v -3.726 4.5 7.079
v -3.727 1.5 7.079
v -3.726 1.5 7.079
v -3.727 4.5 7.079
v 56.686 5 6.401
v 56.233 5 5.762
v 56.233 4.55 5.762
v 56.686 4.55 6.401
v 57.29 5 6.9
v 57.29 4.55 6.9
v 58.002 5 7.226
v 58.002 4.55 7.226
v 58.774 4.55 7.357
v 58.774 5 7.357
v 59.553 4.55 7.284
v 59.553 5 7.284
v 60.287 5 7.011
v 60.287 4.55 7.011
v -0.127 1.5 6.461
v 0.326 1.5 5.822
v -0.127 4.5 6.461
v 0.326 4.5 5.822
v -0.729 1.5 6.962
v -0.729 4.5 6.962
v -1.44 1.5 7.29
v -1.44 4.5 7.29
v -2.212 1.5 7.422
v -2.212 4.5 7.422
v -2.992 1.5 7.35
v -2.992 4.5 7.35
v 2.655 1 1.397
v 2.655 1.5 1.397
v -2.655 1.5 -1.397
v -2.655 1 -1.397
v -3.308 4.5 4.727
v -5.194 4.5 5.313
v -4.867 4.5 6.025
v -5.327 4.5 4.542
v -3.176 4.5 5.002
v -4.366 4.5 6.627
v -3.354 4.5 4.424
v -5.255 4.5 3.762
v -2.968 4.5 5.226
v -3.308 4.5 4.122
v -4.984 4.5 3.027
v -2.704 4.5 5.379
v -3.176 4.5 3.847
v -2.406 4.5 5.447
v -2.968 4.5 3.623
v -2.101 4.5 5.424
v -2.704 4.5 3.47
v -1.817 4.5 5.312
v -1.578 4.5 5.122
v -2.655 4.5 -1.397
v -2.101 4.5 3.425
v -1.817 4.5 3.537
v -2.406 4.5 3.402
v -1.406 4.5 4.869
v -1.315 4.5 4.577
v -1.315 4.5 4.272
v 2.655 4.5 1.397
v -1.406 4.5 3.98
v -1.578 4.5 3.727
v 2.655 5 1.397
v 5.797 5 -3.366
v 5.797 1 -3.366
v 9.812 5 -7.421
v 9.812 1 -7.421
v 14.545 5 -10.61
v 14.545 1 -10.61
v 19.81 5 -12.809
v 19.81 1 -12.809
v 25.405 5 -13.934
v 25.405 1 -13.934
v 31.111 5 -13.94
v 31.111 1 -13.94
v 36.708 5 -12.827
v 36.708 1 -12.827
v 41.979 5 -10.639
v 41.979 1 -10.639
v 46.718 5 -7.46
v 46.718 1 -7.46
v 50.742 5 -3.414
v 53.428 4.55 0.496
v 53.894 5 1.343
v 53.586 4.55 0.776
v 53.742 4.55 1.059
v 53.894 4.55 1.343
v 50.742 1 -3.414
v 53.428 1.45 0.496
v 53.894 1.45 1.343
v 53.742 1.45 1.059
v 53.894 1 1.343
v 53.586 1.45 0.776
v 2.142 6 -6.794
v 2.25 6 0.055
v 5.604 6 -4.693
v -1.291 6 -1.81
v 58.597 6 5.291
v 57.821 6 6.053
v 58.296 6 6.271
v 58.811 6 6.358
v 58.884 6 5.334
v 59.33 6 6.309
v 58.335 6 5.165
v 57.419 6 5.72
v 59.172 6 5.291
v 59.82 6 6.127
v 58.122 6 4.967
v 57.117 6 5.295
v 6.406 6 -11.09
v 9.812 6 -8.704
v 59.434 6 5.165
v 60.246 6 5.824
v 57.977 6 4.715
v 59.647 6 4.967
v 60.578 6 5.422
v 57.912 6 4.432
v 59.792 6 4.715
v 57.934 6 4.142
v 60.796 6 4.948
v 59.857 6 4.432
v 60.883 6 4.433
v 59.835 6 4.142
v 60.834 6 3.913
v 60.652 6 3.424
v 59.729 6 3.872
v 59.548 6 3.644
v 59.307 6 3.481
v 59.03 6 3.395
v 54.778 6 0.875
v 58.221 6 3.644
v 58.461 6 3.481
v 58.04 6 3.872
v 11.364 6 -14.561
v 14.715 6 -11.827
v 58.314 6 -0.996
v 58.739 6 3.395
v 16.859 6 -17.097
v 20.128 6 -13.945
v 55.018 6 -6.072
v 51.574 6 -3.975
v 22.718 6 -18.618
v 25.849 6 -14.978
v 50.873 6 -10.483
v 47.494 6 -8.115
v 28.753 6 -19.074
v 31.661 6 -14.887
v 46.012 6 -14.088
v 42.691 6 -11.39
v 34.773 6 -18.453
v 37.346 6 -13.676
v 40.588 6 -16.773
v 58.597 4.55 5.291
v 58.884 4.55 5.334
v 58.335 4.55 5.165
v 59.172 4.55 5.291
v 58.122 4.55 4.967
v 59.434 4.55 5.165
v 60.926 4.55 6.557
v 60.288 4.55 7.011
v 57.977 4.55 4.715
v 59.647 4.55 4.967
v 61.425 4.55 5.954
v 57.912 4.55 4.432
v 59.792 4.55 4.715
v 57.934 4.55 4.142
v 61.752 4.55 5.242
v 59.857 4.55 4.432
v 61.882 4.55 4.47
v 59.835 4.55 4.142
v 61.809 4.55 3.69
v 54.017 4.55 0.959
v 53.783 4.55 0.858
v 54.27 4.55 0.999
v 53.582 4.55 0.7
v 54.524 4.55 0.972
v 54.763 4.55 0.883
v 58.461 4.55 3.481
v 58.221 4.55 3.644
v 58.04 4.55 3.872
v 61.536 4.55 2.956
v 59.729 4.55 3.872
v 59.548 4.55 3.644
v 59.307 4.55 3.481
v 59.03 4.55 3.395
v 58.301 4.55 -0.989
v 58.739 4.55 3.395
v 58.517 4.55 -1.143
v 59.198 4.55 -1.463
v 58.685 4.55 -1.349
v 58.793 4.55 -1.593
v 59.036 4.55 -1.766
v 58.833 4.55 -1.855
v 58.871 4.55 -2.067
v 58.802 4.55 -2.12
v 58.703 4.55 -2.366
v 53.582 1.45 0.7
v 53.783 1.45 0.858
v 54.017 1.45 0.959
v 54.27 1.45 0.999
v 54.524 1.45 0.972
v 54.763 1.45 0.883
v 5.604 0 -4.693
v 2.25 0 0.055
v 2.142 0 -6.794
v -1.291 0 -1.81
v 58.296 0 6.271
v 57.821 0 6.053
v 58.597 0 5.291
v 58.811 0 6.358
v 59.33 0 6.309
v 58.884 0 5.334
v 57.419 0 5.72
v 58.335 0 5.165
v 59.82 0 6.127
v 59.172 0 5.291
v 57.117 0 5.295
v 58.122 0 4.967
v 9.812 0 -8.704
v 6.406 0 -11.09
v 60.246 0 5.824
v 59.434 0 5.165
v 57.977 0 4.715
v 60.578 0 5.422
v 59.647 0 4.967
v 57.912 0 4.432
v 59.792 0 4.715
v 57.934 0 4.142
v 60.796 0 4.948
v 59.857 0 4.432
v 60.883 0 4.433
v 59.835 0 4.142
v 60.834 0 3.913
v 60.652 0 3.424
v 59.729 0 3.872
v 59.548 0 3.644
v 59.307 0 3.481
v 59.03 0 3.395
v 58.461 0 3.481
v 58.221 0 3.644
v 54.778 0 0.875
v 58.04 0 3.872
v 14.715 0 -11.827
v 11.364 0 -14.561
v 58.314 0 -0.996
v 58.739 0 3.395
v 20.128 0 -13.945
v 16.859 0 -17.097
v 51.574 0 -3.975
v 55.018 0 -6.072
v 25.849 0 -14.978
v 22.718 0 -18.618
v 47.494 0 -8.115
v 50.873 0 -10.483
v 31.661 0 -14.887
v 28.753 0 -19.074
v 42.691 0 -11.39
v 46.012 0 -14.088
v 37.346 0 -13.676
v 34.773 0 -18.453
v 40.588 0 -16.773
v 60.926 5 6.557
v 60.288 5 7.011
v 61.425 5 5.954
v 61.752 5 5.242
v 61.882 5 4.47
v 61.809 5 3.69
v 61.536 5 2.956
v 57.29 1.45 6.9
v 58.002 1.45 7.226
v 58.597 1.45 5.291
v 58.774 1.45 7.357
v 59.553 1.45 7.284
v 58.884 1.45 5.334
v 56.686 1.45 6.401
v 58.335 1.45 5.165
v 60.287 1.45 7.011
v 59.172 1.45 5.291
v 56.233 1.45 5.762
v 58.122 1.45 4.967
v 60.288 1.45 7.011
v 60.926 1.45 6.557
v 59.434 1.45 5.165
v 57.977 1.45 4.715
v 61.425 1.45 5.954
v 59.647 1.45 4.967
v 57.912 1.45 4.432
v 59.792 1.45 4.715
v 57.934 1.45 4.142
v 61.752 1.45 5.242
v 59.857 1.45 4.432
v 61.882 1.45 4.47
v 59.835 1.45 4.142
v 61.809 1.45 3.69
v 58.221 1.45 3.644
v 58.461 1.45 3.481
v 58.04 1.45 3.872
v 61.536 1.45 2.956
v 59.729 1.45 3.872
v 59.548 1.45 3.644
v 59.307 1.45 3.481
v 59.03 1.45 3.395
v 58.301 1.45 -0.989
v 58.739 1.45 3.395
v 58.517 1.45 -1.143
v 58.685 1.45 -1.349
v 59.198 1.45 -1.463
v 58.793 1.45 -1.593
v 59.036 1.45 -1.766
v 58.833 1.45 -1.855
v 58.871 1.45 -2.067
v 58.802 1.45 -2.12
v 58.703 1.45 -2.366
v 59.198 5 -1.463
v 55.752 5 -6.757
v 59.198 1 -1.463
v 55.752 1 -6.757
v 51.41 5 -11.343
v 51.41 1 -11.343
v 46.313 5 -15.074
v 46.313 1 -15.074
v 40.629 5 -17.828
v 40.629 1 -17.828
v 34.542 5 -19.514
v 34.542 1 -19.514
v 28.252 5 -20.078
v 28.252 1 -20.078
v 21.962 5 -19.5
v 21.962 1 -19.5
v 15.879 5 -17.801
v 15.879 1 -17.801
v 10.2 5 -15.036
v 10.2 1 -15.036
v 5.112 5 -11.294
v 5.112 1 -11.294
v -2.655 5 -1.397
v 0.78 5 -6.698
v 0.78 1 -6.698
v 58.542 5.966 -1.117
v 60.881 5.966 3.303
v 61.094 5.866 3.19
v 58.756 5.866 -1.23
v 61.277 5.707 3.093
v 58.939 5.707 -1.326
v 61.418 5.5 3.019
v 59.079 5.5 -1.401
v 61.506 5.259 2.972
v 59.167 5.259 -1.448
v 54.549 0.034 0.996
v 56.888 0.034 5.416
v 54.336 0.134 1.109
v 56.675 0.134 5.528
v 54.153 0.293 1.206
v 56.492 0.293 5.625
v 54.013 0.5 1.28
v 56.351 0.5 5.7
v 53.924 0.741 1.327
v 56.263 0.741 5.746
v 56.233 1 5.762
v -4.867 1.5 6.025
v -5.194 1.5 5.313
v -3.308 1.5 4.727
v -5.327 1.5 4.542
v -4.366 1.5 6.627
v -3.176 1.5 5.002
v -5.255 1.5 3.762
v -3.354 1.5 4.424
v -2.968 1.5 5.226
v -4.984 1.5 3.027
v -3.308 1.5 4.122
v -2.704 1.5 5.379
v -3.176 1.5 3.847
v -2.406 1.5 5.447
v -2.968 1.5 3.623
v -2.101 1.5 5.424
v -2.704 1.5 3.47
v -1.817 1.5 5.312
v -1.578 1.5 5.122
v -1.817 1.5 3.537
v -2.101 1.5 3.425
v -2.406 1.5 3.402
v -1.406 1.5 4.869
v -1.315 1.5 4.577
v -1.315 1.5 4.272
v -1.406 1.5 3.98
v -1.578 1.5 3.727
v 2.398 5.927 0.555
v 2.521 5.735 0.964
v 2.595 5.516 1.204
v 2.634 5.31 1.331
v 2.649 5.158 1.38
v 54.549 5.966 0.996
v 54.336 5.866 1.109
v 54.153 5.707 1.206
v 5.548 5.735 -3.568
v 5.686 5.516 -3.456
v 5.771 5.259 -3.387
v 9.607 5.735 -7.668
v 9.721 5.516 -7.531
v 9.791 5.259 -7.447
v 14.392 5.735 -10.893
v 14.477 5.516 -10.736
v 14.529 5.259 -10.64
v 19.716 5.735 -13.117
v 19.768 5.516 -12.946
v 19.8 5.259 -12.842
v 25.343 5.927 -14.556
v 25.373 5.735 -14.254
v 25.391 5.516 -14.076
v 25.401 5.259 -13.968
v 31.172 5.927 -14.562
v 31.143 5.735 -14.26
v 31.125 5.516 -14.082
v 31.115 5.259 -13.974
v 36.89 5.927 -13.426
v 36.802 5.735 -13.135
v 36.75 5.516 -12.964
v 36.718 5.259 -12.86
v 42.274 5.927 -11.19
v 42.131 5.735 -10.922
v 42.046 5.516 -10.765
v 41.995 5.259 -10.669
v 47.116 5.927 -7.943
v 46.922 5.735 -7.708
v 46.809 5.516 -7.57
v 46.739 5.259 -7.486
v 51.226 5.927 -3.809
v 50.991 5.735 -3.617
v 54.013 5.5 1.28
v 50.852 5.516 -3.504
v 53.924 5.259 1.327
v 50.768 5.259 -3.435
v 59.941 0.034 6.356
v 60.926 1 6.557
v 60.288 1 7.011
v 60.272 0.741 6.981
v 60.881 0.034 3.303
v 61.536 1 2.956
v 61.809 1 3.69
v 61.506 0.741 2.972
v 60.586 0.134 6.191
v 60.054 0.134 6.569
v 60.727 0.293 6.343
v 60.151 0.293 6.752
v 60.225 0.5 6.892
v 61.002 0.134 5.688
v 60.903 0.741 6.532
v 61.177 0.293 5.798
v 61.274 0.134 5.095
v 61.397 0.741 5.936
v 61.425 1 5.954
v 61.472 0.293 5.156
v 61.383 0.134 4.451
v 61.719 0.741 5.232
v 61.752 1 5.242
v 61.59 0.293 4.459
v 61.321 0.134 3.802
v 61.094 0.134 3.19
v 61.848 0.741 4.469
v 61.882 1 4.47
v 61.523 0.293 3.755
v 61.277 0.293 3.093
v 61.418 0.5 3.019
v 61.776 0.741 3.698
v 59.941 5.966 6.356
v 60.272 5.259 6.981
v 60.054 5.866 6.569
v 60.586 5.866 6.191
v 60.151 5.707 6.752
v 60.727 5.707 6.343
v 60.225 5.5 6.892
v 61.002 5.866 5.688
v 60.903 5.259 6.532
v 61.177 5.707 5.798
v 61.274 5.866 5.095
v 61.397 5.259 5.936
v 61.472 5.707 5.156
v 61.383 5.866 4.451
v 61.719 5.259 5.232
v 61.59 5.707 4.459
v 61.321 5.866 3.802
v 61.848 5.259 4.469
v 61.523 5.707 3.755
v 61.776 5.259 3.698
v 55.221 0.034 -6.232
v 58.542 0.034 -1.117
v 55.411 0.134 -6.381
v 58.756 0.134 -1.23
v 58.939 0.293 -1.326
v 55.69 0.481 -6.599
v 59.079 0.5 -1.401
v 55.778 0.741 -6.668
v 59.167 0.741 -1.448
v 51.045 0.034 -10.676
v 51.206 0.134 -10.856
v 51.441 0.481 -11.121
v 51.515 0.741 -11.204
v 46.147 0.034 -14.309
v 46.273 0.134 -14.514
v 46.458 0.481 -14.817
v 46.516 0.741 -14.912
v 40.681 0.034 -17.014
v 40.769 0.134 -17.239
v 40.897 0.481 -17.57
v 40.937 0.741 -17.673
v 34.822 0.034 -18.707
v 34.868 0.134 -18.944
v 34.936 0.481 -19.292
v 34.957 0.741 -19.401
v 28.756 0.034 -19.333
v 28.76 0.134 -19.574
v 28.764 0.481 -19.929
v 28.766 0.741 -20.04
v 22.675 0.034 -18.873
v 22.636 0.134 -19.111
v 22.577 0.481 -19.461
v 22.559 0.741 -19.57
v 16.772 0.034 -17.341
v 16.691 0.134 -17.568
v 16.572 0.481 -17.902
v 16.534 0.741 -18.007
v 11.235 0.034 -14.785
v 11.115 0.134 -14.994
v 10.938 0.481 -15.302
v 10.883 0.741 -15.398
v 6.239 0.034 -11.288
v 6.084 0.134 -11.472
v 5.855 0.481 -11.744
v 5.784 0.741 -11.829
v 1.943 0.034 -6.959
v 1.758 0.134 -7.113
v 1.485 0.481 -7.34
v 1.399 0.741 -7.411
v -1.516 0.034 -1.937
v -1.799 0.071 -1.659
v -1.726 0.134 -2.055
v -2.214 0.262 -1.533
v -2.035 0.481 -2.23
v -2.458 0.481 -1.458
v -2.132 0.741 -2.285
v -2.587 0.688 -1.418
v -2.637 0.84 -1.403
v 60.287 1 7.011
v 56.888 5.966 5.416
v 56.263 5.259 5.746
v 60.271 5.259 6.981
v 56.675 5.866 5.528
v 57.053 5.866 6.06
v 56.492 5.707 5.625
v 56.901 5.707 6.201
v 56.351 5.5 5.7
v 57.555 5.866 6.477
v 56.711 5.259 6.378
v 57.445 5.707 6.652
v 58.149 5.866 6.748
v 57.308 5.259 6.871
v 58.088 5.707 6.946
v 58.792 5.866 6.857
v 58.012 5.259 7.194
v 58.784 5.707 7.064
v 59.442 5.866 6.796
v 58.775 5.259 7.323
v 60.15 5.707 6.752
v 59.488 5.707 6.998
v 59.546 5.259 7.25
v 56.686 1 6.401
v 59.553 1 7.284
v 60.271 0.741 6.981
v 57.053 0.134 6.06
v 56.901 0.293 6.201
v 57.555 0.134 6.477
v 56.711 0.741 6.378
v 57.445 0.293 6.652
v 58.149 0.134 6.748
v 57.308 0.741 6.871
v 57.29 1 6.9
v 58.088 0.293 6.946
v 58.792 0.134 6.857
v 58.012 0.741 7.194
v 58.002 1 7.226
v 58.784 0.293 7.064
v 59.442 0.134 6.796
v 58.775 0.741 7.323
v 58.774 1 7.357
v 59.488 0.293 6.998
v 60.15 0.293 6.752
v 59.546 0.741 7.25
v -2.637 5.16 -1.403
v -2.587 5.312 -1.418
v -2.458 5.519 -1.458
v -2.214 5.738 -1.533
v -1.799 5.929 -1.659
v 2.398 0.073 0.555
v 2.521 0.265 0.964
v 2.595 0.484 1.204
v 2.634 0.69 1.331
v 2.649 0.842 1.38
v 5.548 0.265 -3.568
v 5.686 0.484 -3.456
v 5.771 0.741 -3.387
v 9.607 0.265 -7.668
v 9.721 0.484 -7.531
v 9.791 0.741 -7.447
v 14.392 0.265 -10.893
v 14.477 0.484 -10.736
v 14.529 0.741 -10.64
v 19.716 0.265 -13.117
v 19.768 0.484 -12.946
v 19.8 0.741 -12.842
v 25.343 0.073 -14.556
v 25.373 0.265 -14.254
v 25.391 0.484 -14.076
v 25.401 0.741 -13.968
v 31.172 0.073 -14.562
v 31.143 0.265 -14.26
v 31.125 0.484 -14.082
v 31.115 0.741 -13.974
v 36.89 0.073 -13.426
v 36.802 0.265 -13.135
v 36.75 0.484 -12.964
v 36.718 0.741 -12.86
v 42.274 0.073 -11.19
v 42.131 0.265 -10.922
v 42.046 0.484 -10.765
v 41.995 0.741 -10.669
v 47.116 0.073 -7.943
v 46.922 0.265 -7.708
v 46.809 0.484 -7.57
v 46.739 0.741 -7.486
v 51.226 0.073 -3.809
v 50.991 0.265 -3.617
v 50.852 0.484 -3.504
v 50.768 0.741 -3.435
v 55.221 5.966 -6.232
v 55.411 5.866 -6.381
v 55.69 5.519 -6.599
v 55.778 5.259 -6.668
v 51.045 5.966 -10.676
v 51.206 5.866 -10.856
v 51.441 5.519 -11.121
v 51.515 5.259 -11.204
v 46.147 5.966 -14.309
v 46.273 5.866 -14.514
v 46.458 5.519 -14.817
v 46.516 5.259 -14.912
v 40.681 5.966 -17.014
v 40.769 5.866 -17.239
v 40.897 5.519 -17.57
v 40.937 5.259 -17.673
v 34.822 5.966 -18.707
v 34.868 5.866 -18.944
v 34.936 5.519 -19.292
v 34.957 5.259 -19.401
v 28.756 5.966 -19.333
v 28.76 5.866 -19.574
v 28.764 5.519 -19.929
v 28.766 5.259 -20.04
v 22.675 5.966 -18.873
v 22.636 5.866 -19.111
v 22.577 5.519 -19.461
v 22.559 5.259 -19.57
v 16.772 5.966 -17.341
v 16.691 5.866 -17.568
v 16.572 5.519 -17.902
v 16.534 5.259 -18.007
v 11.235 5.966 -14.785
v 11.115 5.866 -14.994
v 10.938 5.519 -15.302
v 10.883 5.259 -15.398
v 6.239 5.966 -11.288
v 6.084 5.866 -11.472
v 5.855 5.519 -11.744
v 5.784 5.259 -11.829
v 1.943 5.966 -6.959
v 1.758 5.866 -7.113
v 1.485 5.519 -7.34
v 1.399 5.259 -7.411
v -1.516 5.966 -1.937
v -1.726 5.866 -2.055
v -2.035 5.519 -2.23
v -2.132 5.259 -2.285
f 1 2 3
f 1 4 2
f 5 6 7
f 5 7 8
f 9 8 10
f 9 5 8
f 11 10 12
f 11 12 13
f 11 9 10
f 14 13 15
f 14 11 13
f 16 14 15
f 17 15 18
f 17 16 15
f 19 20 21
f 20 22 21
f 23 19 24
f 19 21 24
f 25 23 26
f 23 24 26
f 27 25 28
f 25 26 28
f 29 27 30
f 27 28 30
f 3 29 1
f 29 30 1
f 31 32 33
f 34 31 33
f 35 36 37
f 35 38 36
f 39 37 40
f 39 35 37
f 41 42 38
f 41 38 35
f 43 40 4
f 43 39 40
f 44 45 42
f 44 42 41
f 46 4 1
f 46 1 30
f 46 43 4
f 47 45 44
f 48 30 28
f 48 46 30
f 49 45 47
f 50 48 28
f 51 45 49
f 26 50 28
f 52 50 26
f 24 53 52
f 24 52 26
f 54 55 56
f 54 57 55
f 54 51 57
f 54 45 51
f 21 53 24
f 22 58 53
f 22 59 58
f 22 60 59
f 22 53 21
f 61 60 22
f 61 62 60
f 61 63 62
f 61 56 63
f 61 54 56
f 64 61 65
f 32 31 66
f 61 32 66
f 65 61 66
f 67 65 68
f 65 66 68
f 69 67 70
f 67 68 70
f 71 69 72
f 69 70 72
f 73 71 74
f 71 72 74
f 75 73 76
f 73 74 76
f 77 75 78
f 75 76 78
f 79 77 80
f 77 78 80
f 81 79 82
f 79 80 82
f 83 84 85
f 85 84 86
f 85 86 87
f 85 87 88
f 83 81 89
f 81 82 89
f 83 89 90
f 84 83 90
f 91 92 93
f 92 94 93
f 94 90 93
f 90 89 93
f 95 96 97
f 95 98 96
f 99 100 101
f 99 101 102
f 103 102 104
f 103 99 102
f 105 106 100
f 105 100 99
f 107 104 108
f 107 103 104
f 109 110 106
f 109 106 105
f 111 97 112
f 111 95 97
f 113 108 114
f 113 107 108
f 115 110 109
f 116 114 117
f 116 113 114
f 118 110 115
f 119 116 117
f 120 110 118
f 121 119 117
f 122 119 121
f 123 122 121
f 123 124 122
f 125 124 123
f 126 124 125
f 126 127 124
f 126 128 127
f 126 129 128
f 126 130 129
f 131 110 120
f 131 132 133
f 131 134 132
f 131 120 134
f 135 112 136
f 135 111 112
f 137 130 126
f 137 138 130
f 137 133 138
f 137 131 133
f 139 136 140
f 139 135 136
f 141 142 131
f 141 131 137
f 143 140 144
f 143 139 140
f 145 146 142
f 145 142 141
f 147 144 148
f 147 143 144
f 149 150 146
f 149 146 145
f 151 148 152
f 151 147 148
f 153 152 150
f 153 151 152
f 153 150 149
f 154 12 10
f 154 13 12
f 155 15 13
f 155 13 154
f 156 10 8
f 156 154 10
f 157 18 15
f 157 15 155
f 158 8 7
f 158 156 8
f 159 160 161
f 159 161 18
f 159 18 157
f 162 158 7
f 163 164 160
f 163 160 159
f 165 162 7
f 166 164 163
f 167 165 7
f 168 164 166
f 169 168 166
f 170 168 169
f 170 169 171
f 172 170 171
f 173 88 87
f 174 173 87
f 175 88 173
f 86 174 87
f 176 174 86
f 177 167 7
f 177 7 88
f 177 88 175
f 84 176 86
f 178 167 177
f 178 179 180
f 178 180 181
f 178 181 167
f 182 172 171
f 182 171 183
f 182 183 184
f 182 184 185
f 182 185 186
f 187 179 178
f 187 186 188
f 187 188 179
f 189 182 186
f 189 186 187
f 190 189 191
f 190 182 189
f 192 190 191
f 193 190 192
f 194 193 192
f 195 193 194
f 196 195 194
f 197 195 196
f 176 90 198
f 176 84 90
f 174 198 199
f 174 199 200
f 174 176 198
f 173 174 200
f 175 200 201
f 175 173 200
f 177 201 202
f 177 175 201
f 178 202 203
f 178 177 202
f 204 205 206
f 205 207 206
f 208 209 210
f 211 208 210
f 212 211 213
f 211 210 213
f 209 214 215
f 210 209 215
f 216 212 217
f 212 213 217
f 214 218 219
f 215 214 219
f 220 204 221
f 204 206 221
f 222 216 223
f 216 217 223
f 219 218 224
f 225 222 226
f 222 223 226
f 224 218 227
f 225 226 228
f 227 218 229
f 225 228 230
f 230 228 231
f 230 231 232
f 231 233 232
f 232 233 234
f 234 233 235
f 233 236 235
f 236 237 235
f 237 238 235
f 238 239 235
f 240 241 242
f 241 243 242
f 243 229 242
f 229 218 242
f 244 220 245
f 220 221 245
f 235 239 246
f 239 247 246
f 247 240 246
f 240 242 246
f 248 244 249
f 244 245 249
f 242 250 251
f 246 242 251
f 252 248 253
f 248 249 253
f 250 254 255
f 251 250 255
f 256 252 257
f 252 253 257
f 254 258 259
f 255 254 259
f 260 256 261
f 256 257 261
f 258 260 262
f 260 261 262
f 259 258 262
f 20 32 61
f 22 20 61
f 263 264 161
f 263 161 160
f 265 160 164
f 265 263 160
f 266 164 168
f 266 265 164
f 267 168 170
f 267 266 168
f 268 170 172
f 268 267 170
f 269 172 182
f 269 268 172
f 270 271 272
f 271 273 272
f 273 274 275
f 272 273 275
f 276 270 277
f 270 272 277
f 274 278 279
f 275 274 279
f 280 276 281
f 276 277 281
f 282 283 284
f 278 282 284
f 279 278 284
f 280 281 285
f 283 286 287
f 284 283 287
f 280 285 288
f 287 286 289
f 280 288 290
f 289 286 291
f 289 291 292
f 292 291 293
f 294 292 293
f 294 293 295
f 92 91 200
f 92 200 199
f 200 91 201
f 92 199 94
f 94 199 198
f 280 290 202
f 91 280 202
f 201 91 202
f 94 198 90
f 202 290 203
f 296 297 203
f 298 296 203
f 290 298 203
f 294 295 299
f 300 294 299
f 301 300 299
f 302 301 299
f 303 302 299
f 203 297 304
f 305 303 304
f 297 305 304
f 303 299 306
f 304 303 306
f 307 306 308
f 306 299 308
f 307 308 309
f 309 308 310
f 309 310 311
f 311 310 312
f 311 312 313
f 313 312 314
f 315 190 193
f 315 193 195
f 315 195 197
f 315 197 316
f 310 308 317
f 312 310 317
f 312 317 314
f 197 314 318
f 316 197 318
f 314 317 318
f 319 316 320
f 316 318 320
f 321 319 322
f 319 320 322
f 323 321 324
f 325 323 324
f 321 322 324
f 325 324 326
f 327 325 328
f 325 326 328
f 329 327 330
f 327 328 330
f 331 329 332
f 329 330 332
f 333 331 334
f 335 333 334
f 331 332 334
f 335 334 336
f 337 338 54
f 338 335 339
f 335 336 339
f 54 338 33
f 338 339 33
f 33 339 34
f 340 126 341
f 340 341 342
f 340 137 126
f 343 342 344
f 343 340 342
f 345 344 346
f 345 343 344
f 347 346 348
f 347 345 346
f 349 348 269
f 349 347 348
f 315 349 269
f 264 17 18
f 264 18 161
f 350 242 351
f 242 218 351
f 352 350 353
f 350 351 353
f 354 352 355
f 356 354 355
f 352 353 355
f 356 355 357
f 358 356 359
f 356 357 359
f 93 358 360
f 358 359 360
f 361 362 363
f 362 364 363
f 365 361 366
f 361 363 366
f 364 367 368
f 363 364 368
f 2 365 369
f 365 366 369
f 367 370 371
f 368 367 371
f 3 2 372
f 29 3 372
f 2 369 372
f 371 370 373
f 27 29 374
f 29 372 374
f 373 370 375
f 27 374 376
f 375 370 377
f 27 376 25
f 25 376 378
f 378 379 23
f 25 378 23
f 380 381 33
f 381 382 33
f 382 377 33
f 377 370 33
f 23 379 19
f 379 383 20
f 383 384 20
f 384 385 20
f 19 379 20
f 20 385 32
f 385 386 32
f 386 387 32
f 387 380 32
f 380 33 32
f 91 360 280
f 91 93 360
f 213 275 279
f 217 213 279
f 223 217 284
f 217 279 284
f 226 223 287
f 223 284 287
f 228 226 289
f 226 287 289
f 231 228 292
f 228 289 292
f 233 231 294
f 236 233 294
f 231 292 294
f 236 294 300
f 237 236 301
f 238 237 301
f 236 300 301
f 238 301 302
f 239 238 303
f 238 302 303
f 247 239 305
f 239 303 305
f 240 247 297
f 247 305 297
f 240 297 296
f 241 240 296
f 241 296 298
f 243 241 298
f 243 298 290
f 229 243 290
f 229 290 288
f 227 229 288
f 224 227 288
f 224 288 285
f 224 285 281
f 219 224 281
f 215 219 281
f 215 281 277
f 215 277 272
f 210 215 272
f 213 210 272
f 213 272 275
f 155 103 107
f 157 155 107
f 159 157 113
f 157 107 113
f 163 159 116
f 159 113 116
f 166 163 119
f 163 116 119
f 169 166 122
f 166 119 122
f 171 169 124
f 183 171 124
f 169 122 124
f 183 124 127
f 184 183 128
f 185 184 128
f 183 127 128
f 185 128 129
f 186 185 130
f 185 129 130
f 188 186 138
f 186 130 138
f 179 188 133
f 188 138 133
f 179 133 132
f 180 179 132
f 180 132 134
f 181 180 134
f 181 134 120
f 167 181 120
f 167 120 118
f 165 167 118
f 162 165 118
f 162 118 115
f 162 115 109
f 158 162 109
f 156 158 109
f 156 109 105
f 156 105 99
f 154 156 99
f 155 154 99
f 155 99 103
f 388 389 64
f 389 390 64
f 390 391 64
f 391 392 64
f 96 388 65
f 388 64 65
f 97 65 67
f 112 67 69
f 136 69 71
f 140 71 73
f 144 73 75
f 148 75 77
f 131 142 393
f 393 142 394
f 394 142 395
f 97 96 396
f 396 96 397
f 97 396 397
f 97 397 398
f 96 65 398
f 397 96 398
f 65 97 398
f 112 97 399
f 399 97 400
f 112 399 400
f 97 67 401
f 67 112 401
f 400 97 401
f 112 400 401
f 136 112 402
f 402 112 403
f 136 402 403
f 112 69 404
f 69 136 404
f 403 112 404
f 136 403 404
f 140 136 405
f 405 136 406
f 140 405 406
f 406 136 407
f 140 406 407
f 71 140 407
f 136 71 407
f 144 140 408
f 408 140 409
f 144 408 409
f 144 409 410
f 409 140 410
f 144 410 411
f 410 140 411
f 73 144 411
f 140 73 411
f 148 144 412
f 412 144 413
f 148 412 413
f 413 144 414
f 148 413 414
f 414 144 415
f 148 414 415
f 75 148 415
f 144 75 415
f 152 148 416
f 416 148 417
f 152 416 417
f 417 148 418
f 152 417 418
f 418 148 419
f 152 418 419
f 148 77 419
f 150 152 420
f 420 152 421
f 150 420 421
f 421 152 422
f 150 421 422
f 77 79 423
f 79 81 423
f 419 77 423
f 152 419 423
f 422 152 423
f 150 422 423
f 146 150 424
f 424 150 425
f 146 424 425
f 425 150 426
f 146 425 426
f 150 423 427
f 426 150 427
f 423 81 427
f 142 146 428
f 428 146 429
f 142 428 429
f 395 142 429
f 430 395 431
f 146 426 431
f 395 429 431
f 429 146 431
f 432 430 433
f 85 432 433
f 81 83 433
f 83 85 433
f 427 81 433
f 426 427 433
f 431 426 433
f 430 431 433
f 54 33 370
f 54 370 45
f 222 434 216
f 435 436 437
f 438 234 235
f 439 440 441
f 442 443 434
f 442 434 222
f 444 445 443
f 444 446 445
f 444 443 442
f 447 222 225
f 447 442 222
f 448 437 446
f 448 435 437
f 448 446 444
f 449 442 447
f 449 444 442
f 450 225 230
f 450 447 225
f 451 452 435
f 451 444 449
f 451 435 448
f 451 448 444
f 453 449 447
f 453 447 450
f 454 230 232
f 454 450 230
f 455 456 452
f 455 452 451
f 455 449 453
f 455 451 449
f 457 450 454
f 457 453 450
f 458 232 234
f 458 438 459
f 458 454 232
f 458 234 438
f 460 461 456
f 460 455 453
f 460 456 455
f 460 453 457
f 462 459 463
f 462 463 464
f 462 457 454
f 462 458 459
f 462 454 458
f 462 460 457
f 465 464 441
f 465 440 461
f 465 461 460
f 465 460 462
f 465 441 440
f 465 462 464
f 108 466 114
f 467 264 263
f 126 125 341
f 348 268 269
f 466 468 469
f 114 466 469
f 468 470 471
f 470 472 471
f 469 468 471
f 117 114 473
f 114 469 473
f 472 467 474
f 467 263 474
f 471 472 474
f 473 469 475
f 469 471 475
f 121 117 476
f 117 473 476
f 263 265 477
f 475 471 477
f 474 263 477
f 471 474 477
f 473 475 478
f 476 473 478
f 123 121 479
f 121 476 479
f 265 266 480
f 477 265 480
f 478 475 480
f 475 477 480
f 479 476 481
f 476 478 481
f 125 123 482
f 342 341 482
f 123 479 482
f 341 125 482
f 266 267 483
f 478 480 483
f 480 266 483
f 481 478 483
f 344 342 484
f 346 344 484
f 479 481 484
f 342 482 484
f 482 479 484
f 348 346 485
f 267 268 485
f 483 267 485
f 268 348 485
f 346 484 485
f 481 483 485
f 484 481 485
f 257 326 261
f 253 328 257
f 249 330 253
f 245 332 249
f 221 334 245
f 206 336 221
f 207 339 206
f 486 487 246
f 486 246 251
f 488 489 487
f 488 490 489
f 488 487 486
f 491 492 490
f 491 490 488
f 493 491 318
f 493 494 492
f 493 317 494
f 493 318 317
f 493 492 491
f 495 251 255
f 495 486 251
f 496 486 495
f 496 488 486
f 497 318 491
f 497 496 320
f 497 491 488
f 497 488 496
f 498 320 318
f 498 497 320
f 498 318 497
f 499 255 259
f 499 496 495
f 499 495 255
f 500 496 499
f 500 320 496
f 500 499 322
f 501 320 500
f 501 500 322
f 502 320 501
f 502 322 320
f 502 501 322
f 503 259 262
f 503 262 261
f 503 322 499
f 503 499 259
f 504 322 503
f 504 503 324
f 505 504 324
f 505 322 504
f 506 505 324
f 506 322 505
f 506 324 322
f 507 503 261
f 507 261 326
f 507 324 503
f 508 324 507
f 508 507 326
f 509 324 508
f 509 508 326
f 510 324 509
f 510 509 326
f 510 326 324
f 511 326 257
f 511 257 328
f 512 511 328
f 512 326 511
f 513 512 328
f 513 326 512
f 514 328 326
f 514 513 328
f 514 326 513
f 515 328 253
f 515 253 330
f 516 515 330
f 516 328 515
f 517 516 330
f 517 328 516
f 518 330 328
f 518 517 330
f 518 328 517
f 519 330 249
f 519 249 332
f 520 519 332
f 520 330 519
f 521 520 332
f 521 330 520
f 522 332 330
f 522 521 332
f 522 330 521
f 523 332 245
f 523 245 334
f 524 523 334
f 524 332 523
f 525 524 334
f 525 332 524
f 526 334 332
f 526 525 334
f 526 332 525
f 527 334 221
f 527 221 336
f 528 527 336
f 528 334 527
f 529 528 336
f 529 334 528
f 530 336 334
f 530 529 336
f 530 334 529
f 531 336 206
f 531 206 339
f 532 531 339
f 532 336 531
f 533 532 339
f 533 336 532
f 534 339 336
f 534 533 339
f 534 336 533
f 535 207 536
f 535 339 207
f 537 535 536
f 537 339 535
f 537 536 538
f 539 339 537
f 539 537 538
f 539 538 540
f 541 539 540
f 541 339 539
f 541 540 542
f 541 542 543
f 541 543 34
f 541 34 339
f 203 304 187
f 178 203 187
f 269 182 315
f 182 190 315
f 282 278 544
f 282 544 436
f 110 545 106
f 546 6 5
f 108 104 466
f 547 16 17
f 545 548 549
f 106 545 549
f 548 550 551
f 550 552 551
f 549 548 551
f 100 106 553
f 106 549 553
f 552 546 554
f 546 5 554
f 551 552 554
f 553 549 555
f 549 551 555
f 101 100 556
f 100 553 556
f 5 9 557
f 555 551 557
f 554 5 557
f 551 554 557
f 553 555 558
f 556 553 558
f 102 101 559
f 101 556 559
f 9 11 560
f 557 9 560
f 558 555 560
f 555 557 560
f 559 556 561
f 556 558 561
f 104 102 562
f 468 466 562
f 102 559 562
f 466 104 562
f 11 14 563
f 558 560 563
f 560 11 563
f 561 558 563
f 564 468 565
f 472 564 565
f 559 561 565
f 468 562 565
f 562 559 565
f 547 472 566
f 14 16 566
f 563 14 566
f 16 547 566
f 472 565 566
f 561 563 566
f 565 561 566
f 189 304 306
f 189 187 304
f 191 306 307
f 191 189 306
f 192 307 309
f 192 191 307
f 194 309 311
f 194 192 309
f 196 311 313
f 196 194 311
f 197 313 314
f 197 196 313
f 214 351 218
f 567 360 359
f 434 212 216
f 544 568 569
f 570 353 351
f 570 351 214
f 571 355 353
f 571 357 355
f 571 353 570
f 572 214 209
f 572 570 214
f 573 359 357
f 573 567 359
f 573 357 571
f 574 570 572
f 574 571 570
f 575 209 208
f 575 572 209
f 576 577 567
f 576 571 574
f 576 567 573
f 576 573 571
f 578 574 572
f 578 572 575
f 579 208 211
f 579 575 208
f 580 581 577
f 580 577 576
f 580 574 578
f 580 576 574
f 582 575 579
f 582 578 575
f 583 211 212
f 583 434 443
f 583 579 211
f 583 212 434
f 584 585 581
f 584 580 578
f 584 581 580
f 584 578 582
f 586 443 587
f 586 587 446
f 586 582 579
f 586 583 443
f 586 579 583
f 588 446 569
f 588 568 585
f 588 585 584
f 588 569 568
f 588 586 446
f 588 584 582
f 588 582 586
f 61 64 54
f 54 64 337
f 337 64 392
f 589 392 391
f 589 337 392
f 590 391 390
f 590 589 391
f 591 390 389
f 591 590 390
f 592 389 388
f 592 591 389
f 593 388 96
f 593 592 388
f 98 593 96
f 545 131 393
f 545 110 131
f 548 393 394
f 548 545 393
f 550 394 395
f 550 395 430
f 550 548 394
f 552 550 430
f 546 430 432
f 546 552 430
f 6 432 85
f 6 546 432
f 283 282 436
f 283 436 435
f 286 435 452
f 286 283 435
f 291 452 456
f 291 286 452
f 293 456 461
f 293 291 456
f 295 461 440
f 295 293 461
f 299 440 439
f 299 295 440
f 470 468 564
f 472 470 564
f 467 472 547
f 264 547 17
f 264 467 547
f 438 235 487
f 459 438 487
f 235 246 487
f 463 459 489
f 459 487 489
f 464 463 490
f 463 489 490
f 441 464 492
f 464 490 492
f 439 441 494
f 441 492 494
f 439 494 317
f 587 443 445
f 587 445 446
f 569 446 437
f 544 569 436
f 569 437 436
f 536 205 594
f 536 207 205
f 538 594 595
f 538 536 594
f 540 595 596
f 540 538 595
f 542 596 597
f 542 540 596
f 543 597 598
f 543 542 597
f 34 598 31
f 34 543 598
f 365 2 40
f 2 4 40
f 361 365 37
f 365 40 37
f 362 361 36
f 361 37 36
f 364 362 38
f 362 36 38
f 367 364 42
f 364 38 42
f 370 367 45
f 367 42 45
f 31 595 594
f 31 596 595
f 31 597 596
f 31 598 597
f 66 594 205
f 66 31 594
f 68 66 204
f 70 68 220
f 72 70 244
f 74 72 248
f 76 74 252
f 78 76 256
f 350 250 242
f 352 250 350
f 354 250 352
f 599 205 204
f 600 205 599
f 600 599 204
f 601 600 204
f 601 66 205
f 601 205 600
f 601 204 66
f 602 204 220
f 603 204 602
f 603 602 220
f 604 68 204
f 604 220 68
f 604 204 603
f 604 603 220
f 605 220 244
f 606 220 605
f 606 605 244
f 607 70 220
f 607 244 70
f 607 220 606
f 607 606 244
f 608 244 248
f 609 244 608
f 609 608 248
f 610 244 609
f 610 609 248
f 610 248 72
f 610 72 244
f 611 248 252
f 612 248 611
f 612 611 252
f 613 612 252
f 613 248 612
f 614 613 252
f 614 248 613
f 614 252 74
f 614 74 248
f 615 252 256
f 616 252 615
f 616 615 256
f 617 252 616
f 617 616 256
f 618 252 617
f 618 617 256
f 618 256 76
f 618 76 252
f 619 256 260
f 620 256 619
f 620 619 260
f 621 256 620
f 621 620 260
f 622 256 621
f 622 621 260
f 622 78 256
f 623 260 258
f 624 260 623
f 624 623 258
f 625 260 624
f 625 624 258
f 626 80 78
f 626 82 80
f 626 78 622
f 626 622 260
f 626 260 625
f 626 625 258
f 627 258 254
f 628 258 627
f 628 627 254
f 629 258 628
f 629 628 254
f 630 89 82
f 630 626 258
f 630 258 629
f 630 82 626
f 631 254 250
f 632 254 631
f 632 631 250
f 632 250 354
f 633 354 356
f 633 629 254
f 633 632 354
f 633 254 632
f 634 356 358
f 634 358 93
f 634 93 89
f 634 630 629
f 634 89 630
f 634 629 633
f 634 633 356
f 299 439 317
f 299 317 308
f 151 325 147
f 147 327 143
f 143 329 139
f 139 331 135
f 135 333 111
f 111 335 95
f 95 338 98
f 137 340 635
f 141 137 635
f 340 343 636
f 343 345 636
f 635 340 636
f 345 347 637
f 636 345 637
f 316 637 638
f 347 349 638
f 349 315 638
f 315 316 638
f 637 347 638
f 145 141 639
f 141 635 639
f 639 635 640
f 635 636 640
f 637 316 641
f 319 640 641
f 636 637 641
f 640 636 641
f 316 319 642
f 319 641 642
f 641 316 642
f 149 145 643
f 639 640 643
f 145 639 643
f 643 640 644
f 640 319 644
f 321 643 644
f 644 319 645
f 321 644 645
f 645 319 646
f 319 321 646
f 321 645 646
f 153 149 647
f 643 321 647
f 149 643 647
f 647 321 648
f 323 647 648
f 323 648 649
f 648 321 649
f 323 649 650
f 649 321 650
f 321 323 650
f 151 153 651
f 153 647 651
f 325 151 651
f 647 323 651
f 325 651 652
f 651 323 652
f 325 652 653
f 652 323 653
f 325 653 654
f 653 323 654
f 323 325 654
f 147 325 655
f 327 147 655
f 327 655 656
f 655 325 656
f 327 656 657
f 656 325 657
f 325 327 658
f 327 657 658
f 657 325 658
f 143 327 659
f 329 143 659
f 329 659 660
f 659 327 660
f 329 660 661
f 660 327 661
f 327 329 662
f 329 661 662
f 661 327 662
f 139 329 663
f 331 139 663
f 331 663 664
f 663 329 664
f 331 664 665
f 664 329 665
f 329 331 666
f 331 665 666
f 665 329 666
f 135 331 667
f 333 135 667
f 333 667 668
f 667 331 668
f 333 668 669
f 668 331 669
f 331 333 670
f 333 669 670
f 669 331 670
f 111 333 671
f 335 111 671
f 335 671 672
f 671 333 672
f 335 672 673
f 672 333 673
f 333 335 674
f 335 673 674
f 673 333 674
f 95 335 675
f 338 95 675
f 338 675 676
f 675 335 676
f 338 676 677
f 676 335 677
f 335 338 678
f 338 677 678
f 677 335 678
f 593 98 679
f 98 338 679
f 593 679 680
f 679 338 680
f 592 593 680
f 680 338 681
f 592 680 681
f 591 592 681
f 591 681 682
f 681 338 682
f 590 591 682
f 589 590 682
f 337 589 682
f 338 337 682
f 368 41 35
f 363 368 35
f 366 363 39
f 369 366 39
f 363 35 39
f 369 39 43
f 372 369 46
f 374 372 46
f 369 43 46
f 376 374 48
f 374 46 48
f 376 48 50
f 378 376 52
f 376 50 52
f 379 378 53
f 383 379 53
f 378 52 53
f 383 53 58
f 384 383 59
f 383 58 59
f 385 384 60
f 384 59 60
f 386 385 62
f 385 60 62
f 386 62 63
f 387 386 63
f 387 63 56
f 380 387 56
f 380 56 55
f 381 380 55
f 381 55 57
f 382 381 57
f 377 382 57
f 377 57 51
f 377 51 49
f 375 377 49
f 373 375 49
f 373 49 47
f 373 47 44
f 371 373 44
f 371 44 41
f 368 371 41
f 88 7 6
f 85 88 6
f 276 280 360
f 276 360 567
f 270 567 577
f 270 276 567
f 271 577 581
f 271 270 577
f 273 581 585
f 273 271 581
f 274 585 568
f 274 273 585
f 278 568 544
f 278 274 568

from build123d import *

# Parameters (mm, degrees)
BOSS_EXTRUDE1_DEPTH = 6
CUT_EXTRUDE1_DEPTH  = 6
SKETCH3_W           = 6
SKETCH3_H           = 6
BOSS_EXTRUDE2_DEPTH = 8
SKETCH5_W           = 8
SKETCH5_H           = 3.1
CUT_EXTRUDE2_DEPTH  = 8
SKETCH6_R           = 0.975
CUT_EXTRUDE3_DEPTH  = 8
SKETCH7_W           = 6
SKETCH7_H           = 3
BOSS_EXTRUDE3_DEPTH = 8
SKETCH8_R           = 1.025
CUT_EXTRUDE4_DEPTH  = 8
FILLET1_R           = 3
FILLET2_R           = 1


with BuildPart() as part:
    # Sketch1 → Boss-Extrude1 (new body)
    with BuildSketch(Plane(origin=(0, 0, 0), x_dir=(1, 0, 0), z_dir=(0, 1, 0))):
        with BuildLine():
            ThreePointArc((59.197580629, 1.463473077), (28.251548273, 20.077561964), (-2.65465833, 1.397422323))
            ThreePointArc((-2.65465833, 1.397422323), (-1.397422323, -2.65465833), (2.65465833, -1.397422323))
            ThreePointArc((2.65465833, -1.397422323), (28.257955548, 14.077565385), (53.894245187, -1.342704605))
            ThreePointArc((53.894245187, -1.342704605), (57.949001749, -2.591283485), (59.197580629, 1.463473077))
        make_face()
    extrude(amount=BOSS_EXTRUDE1_DEPTH)

    # Sketch2 → Cut-Extrude1 (cut)
    with BuildSketch(Plane(origin=(0, 6, 0), x_dir=(1, 0, 0), z_dir=(0, 1, 0))):
        Polygon((53.894245187, -1.342704605), (59.197580629, 1.463473077), (61.240293877, -2.397007189), (55.867953369, -5.072773667), align=None)
        Polygon((2.65465833, -1.397422323), (-2.65465833, 1.397422323), (-5.113209947, -2.397007189), (1.520441913, -5.715494495), align=None)
    extrude(amount=-CUT_EXTRUDE1_DEPTH, mode=Mode.SUBTRACT)

    # Sketch3 → Boss-Extrude2 (add)
    with BuildSketch(Plane(origin=(12.343879945, 0, 23.328435834), x_dir=(0.883889240381717, 0, -0.46769628044002154), z_dir=(0.4676962804400216, 0, 0.8838892403817171))):
        with Locations((50.008565489, 3)):
            Rectangle(SKETCH3_W, SKETCH3_H)
    extrude(amount=BOSS_EXTRUDE2_DEPTH)

    # Sketch5 → Cut-Extrude2 (cut)
    with BuildSketch(Plane(origin=(46.853700684, 0, -24.791908911), x_dir=(-0.46769628044002165, 0, -0.883889240381717), z_dir=(0.883889240381717, 0, -0.46769628044002165))):
        with Locations((-30.392940165, 3)):
            Rectangle(SKETCH5_W, SKETCH5_H)
    extrude(amount=-CUT_EXTRUDE2_DEPTH, mode=Mode.SUBTRACT)

    # Sketch6 → Cut-Extrude3 (cut)
    with BuildSketch(Plane(origin=(0, 6, 0), x_dir=(1, 0, 0), z_dir=(0, 1, 0))):
        with Locations(Location((58.88439431, -4.359061966, 0), (0, 0, 270))):
            Circle(SKETCH6_R)
    extrude(amount=-CUT_EXTRUDE3_DEPTH, mode=Mode.SUBTRACT)

    # Sketch7 → Boss-Extrude3 (add)
    with BuildSketch(Plane(origin=(0, 0, 0), x_dir=(0.8848861101120022, 0, 0.4658074410428085), z_dir=(-0.4658074410428085, 0, 0.8848861101120022))):
        with Locations((0, 3)):
            Rectangle(SKETCH7_W, SKETCH7_H)
    extrude(amount=BOSS_EXTRUDE3_DEPTH)

    # Sketch8 → Cut-Extrude4 (cut)
    with BuildSketch(Plane(origin=(0, 4.5, 0), x_dir=(1, 0, 0), z_dir=(0, 1, 0))):
        with Locations(Location((-2.329037205, -4.424430551, 0), (0, 0, 180))):
            Circle(SKETCH8_R)
    extrude(amount=-CUT_EXTRUDE4_DEPTH, mode=Mode.SUBTRACT)

    # Fillet1
    fillet1_edges = [part.edges().sort_by_distance(p)[0] for p in [
        (57.63581543, 5.275, 8.413818528),
        (57.63581543, 0.725, 8.413818528),
        (62.939150873, 0.725, 5.607640846),
        (62.939150873, 5.275, 5.607640846),
        (-1.071801198, 3, 8.476511204),
        (-6.381117859, 3, 5.681666558),
    ]]
    fillet(fillet1_edges, radius=FILLET1_R - 0.0001)  # a hair under: the kernel refuses the full size

    # Fillet2
    fillet2_edges = [part.edges().sort_by_distance(p)[0] for p in [
        (28.251548273, 0, -20.077561964),
        (28.251548273, 6, -20.077561964),
        (60.366844715, 0, 0.746294218),
        (61.751579759, 0, 5.241952749),
        (58.001503527, 0, 7.226247414),
        (55.063509273, 0, 3.552471901),
        (60.366844715, 6, 0.746294218),
        (61.751579759, 6, 5.241952749),
        (58.001503527, 6, 7.226247414),
        (55.063509273, 6, 3.552471901),
        (53.894245187, 3, 1.342704605),
        (59.197580629, 3, -1.463473077),
        (0, 0, 0),
        (0, 6, 0),
        (28.257955548, 0, -14.077565385),
        (28.257955548, 6, -14.077565385),
    ]]
    fillet(fillet2_edges, radius=FILLET2_R)


solid = part.part
